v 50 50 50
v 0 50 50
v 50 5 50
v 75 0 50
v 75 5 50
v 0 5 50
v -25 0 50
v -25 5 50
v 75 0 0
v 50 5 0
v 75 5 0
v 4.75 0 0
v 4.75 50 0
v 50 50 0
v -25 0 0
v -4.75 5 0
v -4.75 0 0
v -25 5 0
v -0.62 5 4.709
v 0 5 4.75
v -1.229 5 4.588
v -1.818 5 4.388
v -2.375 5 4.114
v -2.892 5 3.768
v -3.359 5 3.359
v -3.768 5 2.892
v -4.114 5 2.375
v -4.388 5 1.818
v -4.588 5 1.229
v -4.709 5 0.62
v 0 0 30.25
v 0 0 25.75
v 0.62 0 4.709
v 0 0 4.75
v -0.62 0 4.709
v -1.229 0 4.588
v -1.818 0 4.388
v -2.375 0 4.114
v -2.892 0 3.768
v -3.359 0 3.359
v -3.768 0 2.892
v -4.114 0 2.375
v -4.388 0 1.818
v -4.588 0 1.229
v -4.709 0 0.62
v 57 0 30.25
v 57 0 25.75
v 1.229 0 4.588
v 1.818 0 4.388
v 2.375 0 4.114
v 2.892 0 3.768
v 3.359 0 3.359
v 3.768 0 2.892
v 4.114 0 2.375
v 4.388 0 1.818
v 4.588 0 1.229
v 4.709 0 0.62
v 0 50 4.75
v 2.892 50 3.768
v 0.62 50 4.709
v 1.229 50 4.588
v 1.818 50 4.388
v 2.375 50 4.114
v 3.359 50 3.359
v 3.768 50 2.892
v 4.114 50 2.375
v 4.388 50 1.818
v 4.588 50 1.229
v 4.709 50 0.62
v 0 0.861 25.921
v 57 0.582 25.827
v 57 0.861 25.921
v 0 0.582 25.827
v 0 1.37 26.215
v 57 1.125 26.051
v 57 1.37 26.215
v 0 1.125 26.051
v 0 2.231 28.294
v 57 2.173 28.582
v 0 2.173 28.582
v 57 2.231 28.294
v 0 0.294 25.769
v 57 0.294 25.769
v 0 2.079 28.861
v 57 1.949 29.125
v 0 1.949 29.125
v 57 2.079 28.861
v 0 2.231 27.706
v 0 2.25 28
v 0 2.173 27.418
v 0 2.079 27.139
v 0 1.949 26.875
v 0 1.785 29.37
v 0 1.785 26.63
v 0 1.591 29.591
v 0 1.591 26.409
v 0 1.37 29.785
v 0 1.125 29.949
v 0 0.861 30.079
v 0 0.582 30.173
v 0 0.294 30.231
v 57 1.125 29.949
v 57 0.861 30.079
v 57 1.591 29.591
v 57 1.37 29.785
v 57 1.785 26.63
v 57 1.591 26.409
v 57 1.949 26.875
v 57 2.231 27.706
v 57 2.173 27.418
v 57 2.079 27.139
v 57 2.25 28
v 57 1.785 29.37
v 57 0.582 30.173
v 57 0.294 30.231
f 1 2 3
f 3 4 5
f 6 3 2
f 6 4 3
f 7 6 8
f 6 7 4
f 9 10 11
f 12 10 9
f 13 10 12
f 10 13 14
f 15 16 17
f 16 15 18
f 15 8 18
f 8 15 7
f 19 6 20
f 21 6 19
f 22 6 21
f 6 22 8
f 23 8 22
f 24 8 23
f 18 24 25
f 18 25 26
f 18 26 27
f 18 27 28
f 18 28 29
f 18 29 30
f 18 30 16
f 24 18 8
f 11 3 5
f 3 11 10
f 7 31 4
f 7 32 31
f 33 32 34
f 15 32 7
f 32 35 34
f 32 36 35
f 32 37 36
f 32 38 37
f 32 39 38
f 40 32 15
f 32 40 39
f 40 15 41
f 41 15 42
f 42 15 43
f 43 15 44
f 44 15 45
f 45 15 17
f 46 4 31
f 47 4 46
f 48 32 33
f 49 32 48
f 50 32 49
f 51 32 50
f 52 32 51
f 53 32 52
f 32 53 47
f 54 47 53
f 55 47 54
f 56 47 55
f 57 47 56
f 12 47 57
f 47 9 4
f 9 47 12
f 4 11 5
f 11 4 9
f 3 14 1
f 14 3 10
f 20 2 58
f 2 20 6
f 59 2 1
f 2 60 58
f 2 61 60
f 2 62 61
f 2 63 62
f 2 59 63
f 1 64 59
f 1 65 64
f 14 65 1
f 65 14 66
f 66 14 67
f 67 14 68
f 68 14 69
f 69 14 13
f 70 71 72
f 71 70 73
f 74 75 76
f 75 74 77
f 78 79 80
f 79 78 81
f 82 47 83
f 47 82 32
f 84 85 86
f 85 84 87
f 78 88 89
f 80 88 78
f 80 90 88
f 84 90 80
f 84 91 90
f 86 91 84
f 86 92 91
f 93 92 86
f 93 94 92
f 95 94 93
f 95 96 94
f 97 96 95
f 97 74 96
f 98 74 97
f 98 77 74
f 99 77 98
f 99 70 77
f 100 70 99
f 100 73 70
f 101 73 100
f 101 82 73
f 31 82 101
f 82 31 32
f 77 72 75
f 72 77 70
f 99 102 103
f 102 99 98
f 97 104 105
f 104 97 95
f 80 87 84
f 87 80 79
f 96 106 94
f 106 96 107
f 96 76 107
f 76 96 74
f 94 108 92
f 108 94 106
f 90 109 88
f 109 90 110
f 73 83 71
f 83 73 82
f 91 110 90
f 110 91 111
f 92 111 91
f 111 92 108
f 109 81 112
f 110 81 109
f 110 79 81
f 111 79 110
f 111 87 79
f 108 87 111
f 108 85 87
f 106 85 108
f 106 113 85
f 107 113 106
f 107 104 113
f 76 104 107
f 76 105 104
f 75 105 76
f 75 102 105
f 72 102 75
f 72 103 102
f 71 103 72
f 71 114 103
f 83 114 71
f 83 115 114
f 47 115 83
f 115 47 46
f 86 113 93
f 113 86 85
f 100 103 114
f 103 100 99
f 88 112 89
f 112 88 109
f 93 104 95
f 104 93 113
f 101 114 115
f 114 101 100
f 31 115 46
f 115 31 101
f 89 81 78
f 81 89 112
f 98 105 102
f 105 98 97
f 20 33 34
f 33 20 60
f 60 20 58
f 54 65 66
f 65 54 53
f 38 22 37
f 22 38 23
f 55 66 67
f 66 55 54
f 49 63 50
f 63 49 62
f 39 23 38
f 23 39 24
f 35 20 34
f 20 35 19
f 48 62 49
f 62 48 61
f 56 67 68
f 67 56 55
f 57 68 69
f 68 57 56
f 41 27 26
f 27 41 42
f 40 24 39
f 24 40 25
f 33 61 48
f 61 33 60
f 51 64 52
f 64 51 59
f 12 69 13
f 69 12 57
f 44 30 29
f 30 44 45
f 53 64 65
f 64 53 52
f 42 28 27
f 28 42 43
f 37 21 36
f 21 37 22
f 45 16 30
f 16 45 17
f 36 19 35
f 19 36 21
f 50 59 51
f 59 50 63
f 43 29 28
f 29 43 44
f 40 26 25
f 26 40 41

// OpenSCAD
// L-shaped mounting bracket for a NEMA 17 stepper motor (syringe pump, bench top). NOVEL general part.
//

base_d  = 50;
base_t  = 5;
arm_l   = 50;
arm_t   = 5;
motor_h = 50;
screw  = 4.5;

$fn = 48;

gusset_t = 5;
tunnel   = screw + 5;

difference() {
    union() {
        cube([base_d, base_t, base_t]);                                              // base plate (square, for stability)
        cube([base_d, arm_l, arm_t]);                                                 // motor arm
        cube([base_d, arm_l, motor_h]);                                               // standing motor plate
        for (x = [-base_d / 2, base_d / 2])
            translate([x, 0, 0]) cube([base_d, gusset_t, arm_l]);                     // gussets
    }
    translate([0, -1, 0]) rotate([-90, 0, 0]) cylinder(h = arm_l + 2, d = tunnel);   // motor centre tunnel (Y axis)
    for (z = [28, 28 + 31 / sqrt(2) * 2])                                     // 4 screw holes: 2 x 2 grid in the XZ plane
        translate([0, 0, z]) rotate([0, 90, 0]) cylinder(h = base_t + arm_l + 2, d = screw);
}
